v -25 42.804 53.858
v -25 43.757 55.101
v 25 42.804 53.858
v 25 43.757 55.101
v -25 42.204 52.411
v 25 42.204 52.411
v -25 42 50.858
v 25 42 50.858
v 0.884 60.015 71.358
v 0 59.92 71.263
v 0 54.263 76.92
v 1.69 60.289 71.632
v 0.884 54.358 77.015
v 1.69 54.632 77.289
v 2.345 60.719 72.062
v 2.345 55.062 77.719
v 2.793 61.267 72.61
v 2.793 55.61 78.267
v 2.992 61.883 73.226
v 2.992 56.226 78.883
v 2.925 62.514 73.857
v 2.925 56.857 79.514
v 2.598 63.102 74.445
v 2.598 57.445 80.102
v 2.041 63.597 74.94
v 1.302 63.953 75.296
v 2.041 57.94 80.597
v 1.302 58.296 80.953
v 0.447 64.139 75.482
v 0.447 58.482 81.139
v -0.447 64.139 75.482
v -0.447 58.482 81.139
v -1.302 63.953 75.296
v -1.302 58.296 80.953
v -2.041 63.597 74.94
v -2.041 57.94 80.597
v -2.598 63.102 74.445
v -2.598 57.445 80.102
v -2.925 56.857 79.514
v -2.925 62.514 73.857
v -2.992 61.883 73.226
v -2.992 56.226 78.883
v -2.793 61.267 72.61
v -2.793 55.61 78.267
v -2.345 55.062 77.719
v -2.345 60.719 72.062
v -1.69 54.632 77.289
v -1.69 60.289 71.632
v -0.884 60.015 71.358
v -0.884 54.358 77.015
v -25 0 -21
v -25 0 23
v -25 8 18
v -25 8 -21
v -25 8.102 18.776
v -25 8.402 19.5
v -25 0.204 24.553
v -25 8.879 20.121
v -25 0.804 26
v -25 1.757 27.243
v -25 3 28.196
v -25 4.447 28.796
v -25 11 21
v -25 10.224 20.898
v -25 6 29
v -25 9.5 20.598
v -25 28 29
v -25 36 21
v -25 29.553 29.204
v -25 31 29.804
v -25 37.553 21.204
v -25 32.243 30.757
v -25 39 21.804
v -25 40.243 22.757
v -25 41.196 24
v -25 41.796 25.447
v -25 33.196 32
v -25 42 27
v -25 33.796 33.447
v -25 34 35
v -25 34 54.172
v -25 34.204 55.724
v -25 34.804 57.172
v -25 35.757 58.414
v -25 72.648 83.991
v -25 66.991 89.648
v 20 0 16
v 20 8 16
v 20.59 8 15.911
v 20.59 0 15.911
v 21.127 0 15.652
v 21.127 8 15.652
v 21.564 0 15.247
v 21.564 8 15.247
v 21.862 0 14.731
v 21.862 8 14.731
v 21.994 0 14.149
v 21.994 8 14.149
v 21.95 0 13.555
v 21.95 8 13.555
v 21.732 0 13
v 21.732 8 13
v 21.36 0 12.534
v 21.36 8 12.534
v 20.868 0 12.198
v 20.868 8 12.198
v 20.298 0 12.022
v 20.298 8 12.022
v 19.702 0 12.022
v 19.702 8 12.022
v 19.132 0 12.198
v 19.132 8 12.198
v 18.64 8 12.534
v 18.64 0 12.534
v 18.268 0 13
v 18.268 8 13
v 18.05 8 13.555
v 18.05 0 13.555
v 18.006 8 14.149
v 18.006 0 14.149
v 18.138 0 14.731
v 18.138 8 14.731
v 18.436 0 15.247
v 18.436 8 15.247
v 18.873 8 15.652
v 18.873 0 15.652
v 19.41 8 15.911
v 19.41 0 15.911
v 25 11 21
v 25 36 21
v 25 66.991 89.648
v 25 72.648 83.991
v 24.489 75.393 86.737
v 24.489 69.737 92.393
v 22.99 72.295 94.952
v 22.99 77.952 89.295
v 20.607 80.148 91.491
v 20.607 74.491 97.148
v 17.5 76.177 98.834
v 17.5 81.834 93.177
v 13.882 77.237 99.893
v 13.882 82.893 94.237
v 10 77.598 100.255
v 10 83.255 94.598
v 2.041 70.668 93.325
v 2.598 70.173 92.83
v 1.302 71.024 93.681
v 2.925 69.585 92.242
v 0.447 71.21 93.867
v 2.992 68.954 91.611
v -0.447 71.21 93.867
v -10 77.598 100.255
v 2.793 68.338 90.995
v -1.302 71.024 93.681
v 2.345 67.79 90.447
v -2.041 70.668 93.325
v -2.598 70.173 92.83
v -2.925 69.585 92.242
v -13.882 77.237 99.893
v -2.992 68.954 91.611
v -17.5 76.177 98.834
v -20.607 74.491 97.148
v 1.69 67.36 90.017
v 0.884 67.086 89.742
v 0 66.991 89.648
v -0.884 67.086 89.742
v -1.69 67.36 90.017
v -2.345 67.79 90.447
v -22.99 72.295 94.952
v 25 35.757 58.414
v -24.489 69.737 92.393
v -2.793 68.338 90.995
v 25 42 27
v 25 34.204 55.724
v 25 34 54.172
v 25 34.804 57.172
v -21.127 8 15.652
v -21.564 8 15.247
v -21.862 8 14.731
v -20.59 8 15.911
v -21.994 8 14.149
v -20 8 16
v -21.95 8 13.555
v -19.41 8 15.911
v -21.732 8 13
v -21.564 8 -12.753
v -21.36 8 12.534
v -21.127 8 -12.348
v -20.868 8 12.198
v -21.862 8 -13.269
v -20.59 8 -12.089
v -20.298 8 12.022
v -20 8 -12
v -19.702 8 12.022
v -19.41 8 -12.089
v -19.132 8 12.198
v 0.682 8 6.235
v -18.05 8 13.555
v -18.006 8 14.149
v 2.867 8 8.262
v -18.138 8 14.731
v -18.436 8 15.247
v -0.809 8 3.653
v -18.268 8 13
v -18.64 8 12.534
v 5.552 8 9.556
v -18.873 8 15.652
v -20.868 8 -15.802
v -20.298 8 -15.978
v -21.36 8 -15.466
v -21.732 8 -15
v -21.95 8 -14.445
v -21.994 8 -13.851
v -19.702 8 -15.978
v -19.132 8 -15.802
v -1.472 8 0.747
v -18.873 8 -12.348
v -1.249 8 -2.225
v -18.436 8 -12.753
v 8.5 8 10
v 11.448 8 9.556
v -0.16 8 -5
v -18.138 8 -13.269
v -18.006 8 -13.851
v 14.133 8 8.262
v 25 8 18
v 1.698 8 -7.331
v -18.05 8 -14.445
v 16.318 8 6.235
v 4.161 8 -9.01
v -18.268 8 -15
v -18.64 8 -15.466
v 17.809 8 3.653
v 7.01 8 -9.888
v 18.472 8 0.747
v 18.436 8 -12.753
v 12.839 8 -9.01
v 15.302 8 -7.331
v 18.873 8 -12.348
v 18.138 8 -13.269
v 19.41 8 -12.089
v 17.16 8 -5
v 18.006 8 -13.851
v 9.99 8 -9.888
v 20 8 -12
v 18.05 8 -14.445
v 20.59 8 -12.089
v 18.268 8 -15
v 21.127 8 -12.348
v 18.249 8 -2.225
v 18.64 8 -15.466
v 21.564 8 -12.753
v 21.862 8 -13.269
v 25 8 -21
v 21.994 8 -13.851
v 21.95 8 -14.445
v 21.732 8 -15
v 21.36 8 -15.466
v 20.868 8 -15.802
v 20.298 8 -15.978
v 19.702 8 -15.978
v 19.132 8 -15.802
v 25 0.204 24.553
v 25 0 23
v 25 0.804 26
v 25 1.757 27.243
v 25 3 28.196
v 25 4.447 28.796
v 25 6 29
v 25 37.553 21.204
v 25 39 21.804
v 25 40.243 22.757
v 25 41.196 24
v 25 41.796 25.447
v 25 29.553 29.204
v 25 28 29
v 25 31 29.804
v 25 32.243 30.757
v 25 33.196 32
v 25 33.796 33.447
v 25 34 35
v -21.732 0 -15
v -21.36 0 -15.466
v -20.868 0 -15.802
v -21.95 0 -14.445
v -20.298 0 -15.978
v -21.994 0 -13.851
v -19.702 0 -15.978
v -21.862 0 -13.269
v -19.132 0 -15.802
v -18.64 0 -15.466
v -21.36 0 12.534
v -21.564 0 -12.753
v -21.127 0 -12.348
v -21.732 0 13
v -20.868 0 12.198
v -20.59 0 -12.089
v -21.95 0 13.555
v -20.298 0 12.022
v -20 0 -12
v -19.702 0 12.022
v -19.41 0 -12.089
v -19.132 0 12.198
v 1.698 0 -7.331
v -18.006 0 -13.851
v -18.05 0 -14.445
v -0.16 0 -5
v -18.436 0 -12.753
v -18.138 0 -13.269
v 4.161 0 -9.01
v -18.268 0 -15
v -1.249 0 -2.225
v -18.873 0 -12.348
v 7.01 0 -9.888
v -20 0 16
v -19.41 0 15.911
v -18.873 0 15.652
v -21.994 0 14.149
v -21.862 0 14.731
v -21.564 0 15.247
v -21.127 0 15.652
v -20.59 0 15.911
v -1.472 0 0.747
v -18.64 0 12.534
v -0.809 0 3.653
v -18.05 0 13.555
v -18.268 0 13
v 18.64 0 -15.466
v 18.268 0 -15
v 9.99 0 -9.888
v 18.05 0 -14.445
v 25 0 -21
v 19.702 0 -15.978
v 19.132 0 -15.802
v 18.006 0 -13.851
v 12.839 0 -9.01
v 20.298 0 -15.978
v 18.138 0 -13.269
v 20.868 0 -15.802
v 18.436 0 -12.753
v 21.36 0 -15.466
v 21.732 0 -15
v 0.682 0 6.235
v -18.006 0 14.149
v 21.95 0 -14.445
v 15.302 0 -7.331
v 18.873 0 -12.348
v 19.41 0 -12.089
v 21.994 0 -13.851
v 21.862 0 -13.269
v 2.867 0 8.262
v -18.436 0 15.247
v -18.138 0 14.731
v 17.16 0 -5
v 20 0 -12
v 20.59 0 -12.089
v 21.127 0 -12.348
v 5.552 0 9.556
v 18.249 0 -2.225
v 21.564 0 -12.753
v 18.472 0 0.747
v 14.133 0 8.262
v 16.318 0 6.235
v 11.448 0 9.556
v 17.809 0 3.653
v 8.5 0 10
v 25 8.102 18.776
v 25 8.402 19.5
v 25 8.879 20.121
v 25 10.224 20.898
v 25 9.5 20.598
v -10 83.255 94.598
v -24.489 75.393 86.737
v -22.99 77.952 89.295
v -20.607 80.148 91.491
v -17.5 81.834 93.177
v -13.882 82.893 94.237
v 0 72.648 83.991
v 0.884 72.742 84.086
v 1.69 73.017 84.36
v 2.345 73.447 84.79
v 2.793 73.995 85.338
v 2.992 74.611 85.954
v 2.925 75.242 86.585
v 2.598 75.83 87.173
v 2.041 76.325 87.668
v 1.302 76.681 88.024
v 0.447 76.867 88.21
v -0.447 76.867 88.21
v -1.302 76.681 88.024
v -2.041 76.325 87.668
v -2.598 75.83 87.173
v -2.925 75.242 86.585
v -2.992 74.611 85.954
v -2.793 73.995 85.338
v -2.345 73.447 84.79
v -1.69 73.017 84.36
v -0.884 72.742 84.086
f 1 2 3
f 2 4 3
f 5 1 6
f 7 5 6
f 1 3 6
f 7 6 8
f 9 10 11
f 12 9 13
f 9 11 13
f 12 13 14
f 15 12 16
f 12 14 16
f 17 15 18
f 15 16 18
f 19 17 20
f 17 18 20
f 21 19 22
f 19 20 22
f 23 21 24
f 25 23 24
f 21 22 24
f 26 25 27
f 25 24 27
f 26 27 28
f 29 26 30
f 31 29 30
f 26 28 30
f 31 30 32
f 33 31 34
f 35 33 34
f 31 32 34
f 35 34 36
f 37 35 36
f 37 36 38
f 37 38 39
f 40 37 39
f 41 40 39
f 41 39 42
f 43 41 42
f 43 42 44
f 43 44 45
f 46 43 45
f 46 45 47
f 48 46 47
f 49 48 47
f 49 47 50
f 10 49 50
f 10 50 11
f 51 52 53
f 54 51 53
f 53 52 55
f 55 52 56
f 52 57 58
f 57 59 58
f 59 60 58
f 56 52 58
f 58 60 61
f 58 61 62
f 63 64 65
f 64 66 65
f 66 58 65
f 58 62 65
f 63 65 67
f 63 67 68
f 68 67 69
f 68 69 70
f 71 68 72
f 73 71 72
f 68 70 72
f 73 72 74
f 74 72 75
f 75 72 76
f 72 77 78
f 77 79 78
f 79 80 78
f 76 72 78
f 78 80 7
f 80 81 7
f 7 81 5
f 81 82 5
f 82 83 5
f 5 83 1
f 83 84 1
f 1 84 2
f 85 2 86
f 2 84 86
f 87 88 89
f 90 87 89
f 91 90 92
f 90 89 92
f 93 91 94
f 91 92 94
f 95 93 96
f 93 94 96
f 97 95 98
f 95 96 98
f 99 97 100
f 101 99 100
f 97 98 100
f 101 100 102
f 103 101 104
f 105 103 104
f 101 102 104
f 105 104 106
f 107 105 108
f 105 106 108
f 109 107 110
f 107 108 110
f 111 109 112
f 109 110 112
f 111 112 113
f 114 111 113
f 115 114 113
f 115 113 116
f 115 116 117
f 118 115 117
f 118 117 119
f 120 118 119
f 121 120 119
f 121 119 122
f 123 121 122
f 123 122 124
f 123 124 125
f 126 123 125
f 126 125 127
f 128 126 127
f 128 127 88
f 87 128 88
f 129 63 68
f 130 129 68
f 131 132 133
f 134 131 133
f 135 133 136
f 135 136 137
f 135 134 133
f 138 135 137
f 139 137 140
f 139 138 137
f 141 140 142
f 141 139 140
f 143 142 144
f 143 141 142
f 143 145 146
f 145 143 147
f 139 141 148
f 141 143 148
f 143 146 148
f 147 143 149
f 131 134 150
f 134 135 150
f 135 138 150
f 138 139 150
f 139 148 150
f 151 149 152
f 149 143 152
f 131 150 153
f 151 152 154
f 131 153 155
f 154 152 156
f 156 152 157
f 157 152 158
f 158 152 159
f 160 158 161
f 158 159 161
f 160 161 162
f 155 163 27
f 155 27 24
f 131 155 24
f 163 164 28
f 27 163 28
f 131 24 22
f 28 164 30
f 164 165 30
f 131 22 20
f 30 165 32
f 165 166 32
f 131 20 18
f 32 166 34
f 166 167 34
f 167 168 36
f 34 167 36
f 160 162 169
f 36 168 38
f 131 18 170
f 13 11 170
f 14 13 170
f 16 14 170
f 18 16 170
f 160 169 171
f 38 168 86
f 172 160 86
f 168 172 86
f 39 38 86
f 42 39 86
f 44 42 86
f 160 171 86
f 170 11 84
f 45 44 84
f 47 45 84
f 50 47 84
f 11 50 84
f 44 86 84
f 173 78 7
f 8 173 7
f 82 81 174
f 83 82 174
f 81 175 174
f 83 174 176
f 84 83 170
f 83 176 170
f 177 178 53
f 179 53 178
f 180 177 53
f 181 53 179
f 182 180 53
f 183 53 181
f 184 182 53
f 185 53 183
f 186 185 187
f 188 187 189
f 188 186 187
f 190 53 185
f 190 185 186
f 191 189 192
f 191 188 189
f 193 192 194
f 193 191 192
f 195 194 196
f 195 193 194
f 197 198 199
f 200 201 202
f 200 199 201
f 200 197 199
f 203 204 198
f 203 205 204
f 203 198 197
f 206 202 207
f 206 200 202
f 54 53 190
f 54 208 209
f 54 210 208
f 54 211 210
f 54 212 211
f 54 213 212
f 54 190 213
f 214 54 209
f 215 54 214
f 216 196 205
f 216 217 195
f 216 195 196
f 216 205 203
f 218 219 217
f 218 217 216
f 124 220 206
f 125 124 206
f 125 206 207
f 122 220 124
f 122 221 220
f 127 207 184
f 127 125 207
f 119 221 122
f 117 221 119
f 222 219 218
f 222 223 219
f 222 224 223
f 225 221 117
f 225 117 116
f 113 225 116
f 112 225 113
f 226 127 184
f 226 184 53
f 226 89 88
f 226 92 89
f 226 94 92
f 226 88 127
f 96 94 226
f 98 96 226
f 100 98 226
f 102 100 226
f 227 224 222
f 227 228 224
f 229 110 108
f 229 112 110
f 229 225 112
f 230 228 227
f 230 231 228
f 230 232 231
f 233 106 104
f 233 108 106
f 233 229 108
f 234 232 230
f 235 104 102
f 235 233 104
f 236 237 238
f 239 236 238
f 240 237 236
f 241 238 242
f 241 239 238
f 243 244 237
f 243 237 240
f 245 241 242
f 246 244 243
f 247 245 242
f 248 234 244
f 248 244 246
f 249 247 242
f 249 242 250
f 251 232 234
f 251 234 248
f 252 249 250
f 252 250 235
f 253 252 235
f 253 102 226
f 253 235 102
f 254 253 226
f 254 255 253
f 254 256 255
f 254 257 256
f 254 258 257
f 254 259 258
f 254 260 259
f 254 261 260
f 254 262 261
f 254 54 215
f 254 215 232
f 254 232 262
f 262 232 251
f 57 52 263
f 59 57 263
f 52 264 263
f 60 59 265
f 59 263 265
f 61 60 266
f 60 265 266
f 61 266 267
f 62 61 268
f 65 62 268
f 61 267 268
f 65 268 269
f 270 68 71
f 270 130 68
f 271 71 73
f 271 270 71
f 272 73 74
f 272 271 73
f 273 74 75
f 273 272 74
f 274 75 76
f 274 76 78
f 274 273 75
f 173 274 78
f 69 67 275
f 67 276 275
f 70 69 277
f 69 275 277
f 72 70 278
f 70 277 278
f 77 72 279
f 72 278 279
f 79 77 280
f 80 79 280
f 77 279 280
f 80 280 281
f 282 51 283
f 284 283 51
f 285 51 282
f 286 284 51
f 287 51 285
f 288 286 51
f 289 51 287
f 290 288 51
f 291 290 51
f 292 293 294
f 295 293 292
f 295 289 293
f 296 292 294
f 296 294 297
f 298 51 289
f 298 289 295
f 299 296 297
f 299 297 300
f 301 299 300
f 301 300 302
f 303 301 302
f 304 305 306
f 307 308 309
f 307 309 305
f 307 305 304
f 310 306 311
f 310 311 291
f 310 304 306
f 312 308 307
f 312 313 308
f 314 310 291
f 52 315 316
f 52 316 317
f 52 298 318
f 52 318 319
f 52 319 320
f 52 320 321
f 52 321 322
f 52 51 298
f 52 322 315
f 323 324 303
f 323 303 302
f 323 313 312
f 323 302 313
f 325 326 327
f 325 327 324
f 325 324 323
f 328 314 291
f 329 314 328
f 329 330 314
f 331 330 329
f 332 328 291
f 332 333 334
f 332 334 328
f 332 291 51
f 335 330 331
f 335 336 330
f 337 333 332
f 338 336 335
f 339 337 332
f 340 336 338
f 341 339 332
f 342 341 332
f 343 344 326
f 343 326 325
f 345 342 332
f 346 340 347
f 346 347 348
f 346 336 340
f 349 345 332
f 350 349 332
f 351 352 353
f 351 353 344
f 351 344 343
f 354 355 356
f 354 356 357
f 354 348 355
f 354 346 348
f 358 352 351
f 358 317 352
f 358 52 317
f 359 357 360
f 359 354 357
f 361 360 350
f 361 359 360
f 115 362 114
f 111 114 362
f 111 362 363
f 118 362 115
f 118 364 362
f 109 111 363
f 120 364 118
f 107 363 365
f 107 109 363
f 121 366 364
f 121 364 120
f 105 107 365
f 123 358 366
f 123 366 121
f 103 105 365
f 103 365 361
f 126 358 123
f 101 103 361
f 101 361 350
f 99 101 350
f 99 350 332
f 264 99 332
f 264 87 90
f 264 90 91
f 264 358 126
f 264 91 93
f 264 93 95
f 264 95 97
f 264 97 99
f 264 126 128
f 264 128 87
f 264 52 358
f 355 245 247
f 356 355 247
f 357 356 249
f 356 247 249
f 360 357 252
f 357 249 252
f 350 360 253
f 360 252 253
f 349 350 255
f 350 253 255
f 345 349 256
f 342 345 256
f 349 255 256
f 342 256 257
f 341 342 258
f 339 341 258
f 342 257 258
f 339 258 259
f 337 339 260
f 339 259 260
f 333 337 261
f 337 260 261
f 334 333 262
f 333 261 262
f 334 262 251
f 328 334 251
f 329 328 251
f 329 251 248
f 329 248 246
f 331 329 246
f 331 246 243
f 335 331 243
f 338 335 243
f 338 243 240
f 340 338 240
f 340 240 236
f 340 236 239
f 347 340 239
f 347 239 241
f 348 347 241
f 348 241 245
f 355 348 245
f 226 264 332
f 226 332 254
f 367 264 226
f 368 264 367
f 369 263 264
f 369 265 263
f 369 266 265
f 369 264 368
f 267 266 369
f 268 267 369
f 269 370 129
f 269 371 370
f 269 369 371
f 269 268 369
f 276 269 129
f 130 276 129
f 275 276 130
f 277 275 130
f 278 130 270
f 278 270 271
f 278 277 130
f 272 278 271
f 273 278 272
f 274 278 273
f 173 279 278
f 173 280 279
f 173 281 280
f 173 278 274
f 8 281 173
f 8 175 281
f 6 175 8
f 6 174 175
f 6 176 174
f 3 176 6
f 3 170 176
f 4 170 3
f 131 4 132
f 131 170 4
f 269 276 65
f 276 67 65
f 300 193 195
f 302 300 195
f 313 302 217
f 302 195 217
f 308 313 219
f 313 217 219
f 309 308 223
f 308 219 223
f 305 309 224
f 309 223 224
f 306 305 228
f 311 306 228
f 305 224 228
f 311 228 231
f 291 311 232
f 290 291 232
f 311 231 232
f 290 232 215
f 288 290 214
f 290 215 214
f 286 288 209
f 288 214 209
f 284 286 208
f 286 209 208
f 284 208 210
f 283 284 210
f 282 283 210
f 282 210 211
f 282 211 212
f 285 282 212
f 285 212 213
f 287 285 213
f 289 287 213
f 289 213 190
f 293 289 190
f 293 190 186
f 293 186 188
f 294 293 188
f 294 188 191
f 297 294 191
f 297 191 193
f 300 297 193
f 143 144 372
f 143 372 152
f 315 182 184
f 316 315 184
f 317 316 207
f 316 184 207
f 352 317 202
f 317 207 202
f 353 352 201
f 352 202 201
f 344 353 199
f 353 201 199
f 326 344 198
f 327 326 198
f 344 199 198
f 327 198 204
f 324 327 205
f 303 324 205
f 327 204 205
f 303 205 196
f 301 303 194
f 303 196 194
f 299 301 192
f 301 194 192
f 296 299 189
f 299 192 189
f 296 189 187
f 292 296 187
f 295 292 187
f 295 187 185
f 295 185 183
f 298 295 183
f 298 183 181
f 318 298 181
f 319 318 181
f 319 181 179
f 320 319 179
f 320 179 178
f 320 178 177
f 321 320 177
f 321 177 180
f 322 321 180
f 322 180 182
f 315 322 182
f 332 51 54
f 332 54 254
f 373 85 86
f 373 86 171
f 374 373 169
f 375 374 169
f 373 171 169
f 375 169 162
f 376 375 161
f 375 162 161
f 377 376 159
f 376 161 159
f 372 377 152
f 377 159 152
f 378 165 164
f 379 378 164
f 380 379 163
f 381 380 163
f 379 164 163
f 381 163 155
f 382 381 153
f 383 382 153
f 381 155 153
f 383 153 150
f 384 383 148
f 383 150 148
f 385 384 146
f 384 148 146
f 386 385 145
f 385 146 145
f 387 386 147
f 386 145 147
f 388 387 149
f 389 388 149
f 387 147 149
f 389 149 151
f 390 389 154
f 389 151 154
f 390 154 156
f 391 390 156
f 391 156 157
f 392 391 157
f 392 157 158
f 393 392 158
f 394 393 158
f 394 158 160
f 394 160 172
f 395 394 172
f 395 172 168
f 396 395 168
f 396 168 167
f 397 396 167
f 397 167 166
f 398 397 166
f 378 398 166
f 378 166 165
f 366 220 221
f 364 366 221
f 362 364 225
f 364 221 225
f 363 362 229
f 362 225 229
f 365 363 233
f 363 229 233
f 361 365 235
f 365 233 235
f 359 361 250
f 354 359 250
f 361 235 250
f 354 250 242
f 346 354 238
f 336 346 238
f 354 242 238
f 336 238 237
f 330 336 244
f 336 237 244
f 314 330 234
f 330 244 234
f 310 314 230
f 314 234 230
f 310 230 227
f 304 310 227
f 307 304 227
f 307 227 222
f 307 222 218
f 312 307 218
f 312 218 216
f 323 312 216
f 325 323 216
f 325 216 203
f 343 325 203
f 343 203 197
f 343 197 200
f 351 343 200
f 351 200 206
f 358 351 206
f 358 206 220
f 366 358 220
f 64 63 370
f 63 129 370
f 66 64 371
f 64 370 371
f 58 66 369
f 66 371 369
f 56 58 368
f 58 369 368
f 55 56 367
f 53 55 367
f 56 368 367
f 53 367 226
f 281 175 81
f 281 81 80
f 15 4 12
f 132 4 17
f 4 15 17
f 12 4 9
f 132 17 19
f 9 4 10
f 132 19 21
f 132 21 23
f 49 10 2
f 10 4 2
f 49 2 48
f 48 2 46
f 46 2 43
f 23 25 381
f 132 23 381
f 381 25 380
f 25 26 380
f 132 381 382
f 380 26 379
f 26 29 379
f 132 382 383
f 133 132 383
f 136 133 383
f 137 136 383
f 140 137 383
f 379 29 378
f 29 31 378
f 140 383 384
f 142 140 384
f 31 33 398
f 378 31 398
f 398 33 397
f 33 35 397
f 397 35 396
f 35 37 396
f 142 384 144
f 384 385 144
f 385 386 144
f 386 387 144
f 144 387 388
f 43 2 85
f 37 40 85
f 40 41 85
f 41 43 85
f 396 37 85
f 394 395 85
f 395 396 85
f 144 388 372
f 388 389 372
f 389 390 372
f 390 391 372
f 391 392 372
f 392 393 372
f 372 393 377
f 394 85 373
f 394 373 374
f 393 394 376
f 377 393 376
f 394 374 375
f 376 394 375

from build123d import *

# Parameters (mm, degrees)
SKETCH1_W           = 50
SKETCH1_H           = 42
BOSS_EXTRUDE1_DEPTH = 8
SKETCH2_R           = 2
SKETCH2_R_2         = 10
CUT_EXTRUDE2_DEPTH  = 12
SKETCH6_W           = 50
SKETCH6_H           = 8
BOSS_EXTRUDE3_DEPTH = 33
SWEEP2_START        = -25
SWEEP2_DEPTH        = 50
FILLET1_R           = 6
FILLET2_R           = 3
SKETCH8_R           = 3
CUT_EXTRUDE3_DEPTH  = 38
FILLET3_R           = 15


# Read off the part's stored shape, not the designer's step: Sweep2
with BuildPart() as part:
    # Sketch1 → Boss-Extrude1 (new body)
    with BuildSketch(Plane(origin=(0, 0, 0), x_dir=(1, 0, 0), z_dir=(0, 1, 0))):
        Rectangle(SKETCH1_W, SKETCH1_H)
    extrude(amount=BOSS_EXTRUDE1_DEPTH)

    # Sketch2 → Cut-Extrude2 (cut)
    with BuildSketch(Plane(origin=(0, 8, 0), x_dir=(1, 0, 0), z_dir=(0, 1, 0))):
        with Locations(Location((-20, 14, 0), (0, 0, 270))):
            Circle(SKETCH2_R)
        with Locations(Location((20, 14, 0), (0, 0, 270))):
            Circle(SKETCH2_R)
        with Locations(Location((20, -14, 0), (0, 0, 270))):
            Circle(SKETCH2_R)
        with Locations(Location((-20, -14, 0), (0, 0, 270))):
            Circle(SKETCH2_R)
        with Locations(Location((8.5, 0, 0), (0, 0, 270))):
            Circle(SKETCH2_R_2)
    extrude(amount=-CUT_EXTRUDE2_DEPTH, mode=Mode.SUBTRACT)

    # Sketch6 → Boss-Extrude3 (add)
    with BuildSketch(Plane.XZ):
        with Locations((0, 25)):
            Rectangle(SKETCH6_W, SKETCH6_H)
    extrude(amount=-BOSS_EXTRUDE3_DEPTH)

    # Sweep2 outline → Sweep2 (add)
    with BuildSketch(Plane.YZ.offset(SWEEP2_START)):
        Polygon((33, 29), (33, 21), (42, 21), (42, 53.343145751), (83.254833996, 94.597979746), (77.597979746, 100.254833996), (34, 56.656854249), (34, 29), align=None)
    extrude(amount=SWEEP2_DEPTH)

    # Fillet1
    fillet1_edges = [part.edges().sort_by_distance(p)[0] for p in [
        (0, 0, 29),
        (0, 34, 56.656854249),
        (0, 42, 53.343145751),
        (0, 34, 29),
        (0, 42, 21),
    ]]
    fillet(fillet1_edges, radius=FILLET1_R)

    # Fillet2
    fillet2_edges = [part.edges().sort_by_distance(p)[0] for p in [
        (0, 8, 21),
    ]]
    fillet(fillet2_edges, radius=FILLET2_R)

    # Sketch8 → Cut-Extrude3 (cut)
    with BuildSketch(Plane(origin=(0, -11.328427125, 11.328427125), x_dir=(1, 0, 0), z_dir=(0, -0.7071067811865465, 0.7071067811865487))):
        with Locations(Location((0, 95.76093065, 0), (0, 0, 270))):
            Circle(SKETCH8_R)
        with Locations(Location((0, 113.76093065, 0), (0, 0, 270))):
            Circle(SKETCH8_R)
    extrude(amount=-CUT_EXTRUDE3_DEPTH, mode=Mode.SUBTRACT)

    # Fillet3
    fillet3_edges = [part.edges().sort_by_distance(p)[0] for p in [
        (-25, 80.426406871, 97.426406871),
        (25, 80.426406871, 97.426406871),
    ]]
    fillet(fillet3_edges, radius=FILLET3_R)


solid = part.part
